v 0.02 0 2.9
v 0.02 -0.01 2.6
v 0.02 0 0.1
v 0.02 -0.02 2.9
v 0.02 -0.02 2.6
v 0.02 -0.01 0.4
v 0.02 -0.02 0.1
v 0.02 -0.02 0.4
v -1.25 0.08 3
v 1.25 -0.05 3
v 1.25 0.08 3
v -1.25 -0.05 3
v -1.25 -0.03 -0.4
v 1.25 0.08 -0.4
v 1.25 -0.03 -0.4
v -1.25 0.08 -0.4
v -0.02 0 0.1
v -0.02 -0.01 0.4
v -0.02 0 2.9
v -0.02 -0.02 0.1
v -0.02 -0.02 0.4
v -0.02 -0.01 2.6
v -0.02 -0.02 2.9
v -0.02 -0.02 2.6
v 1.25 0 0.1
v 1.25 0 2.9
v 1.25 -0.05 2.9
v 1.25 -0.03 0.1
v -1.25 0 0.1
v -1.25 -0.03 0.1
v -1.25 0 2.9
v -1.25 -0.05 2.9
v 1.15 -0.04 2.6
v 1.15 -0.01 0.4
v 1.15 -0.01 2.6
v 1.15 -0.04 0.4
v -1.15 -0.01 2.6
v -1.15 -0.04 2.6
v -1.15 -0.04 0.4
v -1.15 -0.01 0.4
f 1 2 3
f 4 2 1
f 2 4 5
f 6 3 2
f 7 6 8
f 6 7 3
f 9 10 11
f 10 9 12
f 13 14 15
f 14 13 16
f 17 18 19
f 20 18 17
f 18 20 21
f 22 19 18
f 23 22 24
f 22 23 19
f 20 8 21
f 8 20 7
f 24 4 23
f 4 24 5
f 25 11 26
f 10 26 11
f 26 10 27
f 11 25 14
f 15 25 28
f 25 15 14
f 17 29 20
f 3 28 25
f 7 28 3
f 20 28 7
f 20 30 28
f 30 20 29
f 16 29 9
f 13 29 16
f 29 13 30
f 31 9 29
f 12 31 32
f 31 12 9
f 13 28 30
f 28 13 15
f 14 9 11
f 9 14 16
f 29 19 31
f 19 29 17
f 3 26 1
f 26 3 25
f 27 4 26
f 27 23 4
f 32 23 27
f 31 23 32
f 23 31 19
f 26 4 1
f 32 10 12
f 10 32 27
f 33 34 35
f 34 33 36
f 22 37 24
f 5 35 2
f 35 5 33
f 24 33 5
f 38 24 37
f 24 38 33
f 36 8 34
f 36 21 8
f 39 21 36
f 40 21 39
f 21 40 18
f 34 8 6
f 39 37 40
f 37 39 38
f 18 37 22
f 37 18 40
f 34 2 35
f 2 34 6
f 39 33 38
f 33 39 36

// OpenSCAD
// Tent shell kit: wall glazed. See lib/lodge_kit.scad.
include <lib/lodge_kit.scad>
kind = "tent";
wall_glazed();
